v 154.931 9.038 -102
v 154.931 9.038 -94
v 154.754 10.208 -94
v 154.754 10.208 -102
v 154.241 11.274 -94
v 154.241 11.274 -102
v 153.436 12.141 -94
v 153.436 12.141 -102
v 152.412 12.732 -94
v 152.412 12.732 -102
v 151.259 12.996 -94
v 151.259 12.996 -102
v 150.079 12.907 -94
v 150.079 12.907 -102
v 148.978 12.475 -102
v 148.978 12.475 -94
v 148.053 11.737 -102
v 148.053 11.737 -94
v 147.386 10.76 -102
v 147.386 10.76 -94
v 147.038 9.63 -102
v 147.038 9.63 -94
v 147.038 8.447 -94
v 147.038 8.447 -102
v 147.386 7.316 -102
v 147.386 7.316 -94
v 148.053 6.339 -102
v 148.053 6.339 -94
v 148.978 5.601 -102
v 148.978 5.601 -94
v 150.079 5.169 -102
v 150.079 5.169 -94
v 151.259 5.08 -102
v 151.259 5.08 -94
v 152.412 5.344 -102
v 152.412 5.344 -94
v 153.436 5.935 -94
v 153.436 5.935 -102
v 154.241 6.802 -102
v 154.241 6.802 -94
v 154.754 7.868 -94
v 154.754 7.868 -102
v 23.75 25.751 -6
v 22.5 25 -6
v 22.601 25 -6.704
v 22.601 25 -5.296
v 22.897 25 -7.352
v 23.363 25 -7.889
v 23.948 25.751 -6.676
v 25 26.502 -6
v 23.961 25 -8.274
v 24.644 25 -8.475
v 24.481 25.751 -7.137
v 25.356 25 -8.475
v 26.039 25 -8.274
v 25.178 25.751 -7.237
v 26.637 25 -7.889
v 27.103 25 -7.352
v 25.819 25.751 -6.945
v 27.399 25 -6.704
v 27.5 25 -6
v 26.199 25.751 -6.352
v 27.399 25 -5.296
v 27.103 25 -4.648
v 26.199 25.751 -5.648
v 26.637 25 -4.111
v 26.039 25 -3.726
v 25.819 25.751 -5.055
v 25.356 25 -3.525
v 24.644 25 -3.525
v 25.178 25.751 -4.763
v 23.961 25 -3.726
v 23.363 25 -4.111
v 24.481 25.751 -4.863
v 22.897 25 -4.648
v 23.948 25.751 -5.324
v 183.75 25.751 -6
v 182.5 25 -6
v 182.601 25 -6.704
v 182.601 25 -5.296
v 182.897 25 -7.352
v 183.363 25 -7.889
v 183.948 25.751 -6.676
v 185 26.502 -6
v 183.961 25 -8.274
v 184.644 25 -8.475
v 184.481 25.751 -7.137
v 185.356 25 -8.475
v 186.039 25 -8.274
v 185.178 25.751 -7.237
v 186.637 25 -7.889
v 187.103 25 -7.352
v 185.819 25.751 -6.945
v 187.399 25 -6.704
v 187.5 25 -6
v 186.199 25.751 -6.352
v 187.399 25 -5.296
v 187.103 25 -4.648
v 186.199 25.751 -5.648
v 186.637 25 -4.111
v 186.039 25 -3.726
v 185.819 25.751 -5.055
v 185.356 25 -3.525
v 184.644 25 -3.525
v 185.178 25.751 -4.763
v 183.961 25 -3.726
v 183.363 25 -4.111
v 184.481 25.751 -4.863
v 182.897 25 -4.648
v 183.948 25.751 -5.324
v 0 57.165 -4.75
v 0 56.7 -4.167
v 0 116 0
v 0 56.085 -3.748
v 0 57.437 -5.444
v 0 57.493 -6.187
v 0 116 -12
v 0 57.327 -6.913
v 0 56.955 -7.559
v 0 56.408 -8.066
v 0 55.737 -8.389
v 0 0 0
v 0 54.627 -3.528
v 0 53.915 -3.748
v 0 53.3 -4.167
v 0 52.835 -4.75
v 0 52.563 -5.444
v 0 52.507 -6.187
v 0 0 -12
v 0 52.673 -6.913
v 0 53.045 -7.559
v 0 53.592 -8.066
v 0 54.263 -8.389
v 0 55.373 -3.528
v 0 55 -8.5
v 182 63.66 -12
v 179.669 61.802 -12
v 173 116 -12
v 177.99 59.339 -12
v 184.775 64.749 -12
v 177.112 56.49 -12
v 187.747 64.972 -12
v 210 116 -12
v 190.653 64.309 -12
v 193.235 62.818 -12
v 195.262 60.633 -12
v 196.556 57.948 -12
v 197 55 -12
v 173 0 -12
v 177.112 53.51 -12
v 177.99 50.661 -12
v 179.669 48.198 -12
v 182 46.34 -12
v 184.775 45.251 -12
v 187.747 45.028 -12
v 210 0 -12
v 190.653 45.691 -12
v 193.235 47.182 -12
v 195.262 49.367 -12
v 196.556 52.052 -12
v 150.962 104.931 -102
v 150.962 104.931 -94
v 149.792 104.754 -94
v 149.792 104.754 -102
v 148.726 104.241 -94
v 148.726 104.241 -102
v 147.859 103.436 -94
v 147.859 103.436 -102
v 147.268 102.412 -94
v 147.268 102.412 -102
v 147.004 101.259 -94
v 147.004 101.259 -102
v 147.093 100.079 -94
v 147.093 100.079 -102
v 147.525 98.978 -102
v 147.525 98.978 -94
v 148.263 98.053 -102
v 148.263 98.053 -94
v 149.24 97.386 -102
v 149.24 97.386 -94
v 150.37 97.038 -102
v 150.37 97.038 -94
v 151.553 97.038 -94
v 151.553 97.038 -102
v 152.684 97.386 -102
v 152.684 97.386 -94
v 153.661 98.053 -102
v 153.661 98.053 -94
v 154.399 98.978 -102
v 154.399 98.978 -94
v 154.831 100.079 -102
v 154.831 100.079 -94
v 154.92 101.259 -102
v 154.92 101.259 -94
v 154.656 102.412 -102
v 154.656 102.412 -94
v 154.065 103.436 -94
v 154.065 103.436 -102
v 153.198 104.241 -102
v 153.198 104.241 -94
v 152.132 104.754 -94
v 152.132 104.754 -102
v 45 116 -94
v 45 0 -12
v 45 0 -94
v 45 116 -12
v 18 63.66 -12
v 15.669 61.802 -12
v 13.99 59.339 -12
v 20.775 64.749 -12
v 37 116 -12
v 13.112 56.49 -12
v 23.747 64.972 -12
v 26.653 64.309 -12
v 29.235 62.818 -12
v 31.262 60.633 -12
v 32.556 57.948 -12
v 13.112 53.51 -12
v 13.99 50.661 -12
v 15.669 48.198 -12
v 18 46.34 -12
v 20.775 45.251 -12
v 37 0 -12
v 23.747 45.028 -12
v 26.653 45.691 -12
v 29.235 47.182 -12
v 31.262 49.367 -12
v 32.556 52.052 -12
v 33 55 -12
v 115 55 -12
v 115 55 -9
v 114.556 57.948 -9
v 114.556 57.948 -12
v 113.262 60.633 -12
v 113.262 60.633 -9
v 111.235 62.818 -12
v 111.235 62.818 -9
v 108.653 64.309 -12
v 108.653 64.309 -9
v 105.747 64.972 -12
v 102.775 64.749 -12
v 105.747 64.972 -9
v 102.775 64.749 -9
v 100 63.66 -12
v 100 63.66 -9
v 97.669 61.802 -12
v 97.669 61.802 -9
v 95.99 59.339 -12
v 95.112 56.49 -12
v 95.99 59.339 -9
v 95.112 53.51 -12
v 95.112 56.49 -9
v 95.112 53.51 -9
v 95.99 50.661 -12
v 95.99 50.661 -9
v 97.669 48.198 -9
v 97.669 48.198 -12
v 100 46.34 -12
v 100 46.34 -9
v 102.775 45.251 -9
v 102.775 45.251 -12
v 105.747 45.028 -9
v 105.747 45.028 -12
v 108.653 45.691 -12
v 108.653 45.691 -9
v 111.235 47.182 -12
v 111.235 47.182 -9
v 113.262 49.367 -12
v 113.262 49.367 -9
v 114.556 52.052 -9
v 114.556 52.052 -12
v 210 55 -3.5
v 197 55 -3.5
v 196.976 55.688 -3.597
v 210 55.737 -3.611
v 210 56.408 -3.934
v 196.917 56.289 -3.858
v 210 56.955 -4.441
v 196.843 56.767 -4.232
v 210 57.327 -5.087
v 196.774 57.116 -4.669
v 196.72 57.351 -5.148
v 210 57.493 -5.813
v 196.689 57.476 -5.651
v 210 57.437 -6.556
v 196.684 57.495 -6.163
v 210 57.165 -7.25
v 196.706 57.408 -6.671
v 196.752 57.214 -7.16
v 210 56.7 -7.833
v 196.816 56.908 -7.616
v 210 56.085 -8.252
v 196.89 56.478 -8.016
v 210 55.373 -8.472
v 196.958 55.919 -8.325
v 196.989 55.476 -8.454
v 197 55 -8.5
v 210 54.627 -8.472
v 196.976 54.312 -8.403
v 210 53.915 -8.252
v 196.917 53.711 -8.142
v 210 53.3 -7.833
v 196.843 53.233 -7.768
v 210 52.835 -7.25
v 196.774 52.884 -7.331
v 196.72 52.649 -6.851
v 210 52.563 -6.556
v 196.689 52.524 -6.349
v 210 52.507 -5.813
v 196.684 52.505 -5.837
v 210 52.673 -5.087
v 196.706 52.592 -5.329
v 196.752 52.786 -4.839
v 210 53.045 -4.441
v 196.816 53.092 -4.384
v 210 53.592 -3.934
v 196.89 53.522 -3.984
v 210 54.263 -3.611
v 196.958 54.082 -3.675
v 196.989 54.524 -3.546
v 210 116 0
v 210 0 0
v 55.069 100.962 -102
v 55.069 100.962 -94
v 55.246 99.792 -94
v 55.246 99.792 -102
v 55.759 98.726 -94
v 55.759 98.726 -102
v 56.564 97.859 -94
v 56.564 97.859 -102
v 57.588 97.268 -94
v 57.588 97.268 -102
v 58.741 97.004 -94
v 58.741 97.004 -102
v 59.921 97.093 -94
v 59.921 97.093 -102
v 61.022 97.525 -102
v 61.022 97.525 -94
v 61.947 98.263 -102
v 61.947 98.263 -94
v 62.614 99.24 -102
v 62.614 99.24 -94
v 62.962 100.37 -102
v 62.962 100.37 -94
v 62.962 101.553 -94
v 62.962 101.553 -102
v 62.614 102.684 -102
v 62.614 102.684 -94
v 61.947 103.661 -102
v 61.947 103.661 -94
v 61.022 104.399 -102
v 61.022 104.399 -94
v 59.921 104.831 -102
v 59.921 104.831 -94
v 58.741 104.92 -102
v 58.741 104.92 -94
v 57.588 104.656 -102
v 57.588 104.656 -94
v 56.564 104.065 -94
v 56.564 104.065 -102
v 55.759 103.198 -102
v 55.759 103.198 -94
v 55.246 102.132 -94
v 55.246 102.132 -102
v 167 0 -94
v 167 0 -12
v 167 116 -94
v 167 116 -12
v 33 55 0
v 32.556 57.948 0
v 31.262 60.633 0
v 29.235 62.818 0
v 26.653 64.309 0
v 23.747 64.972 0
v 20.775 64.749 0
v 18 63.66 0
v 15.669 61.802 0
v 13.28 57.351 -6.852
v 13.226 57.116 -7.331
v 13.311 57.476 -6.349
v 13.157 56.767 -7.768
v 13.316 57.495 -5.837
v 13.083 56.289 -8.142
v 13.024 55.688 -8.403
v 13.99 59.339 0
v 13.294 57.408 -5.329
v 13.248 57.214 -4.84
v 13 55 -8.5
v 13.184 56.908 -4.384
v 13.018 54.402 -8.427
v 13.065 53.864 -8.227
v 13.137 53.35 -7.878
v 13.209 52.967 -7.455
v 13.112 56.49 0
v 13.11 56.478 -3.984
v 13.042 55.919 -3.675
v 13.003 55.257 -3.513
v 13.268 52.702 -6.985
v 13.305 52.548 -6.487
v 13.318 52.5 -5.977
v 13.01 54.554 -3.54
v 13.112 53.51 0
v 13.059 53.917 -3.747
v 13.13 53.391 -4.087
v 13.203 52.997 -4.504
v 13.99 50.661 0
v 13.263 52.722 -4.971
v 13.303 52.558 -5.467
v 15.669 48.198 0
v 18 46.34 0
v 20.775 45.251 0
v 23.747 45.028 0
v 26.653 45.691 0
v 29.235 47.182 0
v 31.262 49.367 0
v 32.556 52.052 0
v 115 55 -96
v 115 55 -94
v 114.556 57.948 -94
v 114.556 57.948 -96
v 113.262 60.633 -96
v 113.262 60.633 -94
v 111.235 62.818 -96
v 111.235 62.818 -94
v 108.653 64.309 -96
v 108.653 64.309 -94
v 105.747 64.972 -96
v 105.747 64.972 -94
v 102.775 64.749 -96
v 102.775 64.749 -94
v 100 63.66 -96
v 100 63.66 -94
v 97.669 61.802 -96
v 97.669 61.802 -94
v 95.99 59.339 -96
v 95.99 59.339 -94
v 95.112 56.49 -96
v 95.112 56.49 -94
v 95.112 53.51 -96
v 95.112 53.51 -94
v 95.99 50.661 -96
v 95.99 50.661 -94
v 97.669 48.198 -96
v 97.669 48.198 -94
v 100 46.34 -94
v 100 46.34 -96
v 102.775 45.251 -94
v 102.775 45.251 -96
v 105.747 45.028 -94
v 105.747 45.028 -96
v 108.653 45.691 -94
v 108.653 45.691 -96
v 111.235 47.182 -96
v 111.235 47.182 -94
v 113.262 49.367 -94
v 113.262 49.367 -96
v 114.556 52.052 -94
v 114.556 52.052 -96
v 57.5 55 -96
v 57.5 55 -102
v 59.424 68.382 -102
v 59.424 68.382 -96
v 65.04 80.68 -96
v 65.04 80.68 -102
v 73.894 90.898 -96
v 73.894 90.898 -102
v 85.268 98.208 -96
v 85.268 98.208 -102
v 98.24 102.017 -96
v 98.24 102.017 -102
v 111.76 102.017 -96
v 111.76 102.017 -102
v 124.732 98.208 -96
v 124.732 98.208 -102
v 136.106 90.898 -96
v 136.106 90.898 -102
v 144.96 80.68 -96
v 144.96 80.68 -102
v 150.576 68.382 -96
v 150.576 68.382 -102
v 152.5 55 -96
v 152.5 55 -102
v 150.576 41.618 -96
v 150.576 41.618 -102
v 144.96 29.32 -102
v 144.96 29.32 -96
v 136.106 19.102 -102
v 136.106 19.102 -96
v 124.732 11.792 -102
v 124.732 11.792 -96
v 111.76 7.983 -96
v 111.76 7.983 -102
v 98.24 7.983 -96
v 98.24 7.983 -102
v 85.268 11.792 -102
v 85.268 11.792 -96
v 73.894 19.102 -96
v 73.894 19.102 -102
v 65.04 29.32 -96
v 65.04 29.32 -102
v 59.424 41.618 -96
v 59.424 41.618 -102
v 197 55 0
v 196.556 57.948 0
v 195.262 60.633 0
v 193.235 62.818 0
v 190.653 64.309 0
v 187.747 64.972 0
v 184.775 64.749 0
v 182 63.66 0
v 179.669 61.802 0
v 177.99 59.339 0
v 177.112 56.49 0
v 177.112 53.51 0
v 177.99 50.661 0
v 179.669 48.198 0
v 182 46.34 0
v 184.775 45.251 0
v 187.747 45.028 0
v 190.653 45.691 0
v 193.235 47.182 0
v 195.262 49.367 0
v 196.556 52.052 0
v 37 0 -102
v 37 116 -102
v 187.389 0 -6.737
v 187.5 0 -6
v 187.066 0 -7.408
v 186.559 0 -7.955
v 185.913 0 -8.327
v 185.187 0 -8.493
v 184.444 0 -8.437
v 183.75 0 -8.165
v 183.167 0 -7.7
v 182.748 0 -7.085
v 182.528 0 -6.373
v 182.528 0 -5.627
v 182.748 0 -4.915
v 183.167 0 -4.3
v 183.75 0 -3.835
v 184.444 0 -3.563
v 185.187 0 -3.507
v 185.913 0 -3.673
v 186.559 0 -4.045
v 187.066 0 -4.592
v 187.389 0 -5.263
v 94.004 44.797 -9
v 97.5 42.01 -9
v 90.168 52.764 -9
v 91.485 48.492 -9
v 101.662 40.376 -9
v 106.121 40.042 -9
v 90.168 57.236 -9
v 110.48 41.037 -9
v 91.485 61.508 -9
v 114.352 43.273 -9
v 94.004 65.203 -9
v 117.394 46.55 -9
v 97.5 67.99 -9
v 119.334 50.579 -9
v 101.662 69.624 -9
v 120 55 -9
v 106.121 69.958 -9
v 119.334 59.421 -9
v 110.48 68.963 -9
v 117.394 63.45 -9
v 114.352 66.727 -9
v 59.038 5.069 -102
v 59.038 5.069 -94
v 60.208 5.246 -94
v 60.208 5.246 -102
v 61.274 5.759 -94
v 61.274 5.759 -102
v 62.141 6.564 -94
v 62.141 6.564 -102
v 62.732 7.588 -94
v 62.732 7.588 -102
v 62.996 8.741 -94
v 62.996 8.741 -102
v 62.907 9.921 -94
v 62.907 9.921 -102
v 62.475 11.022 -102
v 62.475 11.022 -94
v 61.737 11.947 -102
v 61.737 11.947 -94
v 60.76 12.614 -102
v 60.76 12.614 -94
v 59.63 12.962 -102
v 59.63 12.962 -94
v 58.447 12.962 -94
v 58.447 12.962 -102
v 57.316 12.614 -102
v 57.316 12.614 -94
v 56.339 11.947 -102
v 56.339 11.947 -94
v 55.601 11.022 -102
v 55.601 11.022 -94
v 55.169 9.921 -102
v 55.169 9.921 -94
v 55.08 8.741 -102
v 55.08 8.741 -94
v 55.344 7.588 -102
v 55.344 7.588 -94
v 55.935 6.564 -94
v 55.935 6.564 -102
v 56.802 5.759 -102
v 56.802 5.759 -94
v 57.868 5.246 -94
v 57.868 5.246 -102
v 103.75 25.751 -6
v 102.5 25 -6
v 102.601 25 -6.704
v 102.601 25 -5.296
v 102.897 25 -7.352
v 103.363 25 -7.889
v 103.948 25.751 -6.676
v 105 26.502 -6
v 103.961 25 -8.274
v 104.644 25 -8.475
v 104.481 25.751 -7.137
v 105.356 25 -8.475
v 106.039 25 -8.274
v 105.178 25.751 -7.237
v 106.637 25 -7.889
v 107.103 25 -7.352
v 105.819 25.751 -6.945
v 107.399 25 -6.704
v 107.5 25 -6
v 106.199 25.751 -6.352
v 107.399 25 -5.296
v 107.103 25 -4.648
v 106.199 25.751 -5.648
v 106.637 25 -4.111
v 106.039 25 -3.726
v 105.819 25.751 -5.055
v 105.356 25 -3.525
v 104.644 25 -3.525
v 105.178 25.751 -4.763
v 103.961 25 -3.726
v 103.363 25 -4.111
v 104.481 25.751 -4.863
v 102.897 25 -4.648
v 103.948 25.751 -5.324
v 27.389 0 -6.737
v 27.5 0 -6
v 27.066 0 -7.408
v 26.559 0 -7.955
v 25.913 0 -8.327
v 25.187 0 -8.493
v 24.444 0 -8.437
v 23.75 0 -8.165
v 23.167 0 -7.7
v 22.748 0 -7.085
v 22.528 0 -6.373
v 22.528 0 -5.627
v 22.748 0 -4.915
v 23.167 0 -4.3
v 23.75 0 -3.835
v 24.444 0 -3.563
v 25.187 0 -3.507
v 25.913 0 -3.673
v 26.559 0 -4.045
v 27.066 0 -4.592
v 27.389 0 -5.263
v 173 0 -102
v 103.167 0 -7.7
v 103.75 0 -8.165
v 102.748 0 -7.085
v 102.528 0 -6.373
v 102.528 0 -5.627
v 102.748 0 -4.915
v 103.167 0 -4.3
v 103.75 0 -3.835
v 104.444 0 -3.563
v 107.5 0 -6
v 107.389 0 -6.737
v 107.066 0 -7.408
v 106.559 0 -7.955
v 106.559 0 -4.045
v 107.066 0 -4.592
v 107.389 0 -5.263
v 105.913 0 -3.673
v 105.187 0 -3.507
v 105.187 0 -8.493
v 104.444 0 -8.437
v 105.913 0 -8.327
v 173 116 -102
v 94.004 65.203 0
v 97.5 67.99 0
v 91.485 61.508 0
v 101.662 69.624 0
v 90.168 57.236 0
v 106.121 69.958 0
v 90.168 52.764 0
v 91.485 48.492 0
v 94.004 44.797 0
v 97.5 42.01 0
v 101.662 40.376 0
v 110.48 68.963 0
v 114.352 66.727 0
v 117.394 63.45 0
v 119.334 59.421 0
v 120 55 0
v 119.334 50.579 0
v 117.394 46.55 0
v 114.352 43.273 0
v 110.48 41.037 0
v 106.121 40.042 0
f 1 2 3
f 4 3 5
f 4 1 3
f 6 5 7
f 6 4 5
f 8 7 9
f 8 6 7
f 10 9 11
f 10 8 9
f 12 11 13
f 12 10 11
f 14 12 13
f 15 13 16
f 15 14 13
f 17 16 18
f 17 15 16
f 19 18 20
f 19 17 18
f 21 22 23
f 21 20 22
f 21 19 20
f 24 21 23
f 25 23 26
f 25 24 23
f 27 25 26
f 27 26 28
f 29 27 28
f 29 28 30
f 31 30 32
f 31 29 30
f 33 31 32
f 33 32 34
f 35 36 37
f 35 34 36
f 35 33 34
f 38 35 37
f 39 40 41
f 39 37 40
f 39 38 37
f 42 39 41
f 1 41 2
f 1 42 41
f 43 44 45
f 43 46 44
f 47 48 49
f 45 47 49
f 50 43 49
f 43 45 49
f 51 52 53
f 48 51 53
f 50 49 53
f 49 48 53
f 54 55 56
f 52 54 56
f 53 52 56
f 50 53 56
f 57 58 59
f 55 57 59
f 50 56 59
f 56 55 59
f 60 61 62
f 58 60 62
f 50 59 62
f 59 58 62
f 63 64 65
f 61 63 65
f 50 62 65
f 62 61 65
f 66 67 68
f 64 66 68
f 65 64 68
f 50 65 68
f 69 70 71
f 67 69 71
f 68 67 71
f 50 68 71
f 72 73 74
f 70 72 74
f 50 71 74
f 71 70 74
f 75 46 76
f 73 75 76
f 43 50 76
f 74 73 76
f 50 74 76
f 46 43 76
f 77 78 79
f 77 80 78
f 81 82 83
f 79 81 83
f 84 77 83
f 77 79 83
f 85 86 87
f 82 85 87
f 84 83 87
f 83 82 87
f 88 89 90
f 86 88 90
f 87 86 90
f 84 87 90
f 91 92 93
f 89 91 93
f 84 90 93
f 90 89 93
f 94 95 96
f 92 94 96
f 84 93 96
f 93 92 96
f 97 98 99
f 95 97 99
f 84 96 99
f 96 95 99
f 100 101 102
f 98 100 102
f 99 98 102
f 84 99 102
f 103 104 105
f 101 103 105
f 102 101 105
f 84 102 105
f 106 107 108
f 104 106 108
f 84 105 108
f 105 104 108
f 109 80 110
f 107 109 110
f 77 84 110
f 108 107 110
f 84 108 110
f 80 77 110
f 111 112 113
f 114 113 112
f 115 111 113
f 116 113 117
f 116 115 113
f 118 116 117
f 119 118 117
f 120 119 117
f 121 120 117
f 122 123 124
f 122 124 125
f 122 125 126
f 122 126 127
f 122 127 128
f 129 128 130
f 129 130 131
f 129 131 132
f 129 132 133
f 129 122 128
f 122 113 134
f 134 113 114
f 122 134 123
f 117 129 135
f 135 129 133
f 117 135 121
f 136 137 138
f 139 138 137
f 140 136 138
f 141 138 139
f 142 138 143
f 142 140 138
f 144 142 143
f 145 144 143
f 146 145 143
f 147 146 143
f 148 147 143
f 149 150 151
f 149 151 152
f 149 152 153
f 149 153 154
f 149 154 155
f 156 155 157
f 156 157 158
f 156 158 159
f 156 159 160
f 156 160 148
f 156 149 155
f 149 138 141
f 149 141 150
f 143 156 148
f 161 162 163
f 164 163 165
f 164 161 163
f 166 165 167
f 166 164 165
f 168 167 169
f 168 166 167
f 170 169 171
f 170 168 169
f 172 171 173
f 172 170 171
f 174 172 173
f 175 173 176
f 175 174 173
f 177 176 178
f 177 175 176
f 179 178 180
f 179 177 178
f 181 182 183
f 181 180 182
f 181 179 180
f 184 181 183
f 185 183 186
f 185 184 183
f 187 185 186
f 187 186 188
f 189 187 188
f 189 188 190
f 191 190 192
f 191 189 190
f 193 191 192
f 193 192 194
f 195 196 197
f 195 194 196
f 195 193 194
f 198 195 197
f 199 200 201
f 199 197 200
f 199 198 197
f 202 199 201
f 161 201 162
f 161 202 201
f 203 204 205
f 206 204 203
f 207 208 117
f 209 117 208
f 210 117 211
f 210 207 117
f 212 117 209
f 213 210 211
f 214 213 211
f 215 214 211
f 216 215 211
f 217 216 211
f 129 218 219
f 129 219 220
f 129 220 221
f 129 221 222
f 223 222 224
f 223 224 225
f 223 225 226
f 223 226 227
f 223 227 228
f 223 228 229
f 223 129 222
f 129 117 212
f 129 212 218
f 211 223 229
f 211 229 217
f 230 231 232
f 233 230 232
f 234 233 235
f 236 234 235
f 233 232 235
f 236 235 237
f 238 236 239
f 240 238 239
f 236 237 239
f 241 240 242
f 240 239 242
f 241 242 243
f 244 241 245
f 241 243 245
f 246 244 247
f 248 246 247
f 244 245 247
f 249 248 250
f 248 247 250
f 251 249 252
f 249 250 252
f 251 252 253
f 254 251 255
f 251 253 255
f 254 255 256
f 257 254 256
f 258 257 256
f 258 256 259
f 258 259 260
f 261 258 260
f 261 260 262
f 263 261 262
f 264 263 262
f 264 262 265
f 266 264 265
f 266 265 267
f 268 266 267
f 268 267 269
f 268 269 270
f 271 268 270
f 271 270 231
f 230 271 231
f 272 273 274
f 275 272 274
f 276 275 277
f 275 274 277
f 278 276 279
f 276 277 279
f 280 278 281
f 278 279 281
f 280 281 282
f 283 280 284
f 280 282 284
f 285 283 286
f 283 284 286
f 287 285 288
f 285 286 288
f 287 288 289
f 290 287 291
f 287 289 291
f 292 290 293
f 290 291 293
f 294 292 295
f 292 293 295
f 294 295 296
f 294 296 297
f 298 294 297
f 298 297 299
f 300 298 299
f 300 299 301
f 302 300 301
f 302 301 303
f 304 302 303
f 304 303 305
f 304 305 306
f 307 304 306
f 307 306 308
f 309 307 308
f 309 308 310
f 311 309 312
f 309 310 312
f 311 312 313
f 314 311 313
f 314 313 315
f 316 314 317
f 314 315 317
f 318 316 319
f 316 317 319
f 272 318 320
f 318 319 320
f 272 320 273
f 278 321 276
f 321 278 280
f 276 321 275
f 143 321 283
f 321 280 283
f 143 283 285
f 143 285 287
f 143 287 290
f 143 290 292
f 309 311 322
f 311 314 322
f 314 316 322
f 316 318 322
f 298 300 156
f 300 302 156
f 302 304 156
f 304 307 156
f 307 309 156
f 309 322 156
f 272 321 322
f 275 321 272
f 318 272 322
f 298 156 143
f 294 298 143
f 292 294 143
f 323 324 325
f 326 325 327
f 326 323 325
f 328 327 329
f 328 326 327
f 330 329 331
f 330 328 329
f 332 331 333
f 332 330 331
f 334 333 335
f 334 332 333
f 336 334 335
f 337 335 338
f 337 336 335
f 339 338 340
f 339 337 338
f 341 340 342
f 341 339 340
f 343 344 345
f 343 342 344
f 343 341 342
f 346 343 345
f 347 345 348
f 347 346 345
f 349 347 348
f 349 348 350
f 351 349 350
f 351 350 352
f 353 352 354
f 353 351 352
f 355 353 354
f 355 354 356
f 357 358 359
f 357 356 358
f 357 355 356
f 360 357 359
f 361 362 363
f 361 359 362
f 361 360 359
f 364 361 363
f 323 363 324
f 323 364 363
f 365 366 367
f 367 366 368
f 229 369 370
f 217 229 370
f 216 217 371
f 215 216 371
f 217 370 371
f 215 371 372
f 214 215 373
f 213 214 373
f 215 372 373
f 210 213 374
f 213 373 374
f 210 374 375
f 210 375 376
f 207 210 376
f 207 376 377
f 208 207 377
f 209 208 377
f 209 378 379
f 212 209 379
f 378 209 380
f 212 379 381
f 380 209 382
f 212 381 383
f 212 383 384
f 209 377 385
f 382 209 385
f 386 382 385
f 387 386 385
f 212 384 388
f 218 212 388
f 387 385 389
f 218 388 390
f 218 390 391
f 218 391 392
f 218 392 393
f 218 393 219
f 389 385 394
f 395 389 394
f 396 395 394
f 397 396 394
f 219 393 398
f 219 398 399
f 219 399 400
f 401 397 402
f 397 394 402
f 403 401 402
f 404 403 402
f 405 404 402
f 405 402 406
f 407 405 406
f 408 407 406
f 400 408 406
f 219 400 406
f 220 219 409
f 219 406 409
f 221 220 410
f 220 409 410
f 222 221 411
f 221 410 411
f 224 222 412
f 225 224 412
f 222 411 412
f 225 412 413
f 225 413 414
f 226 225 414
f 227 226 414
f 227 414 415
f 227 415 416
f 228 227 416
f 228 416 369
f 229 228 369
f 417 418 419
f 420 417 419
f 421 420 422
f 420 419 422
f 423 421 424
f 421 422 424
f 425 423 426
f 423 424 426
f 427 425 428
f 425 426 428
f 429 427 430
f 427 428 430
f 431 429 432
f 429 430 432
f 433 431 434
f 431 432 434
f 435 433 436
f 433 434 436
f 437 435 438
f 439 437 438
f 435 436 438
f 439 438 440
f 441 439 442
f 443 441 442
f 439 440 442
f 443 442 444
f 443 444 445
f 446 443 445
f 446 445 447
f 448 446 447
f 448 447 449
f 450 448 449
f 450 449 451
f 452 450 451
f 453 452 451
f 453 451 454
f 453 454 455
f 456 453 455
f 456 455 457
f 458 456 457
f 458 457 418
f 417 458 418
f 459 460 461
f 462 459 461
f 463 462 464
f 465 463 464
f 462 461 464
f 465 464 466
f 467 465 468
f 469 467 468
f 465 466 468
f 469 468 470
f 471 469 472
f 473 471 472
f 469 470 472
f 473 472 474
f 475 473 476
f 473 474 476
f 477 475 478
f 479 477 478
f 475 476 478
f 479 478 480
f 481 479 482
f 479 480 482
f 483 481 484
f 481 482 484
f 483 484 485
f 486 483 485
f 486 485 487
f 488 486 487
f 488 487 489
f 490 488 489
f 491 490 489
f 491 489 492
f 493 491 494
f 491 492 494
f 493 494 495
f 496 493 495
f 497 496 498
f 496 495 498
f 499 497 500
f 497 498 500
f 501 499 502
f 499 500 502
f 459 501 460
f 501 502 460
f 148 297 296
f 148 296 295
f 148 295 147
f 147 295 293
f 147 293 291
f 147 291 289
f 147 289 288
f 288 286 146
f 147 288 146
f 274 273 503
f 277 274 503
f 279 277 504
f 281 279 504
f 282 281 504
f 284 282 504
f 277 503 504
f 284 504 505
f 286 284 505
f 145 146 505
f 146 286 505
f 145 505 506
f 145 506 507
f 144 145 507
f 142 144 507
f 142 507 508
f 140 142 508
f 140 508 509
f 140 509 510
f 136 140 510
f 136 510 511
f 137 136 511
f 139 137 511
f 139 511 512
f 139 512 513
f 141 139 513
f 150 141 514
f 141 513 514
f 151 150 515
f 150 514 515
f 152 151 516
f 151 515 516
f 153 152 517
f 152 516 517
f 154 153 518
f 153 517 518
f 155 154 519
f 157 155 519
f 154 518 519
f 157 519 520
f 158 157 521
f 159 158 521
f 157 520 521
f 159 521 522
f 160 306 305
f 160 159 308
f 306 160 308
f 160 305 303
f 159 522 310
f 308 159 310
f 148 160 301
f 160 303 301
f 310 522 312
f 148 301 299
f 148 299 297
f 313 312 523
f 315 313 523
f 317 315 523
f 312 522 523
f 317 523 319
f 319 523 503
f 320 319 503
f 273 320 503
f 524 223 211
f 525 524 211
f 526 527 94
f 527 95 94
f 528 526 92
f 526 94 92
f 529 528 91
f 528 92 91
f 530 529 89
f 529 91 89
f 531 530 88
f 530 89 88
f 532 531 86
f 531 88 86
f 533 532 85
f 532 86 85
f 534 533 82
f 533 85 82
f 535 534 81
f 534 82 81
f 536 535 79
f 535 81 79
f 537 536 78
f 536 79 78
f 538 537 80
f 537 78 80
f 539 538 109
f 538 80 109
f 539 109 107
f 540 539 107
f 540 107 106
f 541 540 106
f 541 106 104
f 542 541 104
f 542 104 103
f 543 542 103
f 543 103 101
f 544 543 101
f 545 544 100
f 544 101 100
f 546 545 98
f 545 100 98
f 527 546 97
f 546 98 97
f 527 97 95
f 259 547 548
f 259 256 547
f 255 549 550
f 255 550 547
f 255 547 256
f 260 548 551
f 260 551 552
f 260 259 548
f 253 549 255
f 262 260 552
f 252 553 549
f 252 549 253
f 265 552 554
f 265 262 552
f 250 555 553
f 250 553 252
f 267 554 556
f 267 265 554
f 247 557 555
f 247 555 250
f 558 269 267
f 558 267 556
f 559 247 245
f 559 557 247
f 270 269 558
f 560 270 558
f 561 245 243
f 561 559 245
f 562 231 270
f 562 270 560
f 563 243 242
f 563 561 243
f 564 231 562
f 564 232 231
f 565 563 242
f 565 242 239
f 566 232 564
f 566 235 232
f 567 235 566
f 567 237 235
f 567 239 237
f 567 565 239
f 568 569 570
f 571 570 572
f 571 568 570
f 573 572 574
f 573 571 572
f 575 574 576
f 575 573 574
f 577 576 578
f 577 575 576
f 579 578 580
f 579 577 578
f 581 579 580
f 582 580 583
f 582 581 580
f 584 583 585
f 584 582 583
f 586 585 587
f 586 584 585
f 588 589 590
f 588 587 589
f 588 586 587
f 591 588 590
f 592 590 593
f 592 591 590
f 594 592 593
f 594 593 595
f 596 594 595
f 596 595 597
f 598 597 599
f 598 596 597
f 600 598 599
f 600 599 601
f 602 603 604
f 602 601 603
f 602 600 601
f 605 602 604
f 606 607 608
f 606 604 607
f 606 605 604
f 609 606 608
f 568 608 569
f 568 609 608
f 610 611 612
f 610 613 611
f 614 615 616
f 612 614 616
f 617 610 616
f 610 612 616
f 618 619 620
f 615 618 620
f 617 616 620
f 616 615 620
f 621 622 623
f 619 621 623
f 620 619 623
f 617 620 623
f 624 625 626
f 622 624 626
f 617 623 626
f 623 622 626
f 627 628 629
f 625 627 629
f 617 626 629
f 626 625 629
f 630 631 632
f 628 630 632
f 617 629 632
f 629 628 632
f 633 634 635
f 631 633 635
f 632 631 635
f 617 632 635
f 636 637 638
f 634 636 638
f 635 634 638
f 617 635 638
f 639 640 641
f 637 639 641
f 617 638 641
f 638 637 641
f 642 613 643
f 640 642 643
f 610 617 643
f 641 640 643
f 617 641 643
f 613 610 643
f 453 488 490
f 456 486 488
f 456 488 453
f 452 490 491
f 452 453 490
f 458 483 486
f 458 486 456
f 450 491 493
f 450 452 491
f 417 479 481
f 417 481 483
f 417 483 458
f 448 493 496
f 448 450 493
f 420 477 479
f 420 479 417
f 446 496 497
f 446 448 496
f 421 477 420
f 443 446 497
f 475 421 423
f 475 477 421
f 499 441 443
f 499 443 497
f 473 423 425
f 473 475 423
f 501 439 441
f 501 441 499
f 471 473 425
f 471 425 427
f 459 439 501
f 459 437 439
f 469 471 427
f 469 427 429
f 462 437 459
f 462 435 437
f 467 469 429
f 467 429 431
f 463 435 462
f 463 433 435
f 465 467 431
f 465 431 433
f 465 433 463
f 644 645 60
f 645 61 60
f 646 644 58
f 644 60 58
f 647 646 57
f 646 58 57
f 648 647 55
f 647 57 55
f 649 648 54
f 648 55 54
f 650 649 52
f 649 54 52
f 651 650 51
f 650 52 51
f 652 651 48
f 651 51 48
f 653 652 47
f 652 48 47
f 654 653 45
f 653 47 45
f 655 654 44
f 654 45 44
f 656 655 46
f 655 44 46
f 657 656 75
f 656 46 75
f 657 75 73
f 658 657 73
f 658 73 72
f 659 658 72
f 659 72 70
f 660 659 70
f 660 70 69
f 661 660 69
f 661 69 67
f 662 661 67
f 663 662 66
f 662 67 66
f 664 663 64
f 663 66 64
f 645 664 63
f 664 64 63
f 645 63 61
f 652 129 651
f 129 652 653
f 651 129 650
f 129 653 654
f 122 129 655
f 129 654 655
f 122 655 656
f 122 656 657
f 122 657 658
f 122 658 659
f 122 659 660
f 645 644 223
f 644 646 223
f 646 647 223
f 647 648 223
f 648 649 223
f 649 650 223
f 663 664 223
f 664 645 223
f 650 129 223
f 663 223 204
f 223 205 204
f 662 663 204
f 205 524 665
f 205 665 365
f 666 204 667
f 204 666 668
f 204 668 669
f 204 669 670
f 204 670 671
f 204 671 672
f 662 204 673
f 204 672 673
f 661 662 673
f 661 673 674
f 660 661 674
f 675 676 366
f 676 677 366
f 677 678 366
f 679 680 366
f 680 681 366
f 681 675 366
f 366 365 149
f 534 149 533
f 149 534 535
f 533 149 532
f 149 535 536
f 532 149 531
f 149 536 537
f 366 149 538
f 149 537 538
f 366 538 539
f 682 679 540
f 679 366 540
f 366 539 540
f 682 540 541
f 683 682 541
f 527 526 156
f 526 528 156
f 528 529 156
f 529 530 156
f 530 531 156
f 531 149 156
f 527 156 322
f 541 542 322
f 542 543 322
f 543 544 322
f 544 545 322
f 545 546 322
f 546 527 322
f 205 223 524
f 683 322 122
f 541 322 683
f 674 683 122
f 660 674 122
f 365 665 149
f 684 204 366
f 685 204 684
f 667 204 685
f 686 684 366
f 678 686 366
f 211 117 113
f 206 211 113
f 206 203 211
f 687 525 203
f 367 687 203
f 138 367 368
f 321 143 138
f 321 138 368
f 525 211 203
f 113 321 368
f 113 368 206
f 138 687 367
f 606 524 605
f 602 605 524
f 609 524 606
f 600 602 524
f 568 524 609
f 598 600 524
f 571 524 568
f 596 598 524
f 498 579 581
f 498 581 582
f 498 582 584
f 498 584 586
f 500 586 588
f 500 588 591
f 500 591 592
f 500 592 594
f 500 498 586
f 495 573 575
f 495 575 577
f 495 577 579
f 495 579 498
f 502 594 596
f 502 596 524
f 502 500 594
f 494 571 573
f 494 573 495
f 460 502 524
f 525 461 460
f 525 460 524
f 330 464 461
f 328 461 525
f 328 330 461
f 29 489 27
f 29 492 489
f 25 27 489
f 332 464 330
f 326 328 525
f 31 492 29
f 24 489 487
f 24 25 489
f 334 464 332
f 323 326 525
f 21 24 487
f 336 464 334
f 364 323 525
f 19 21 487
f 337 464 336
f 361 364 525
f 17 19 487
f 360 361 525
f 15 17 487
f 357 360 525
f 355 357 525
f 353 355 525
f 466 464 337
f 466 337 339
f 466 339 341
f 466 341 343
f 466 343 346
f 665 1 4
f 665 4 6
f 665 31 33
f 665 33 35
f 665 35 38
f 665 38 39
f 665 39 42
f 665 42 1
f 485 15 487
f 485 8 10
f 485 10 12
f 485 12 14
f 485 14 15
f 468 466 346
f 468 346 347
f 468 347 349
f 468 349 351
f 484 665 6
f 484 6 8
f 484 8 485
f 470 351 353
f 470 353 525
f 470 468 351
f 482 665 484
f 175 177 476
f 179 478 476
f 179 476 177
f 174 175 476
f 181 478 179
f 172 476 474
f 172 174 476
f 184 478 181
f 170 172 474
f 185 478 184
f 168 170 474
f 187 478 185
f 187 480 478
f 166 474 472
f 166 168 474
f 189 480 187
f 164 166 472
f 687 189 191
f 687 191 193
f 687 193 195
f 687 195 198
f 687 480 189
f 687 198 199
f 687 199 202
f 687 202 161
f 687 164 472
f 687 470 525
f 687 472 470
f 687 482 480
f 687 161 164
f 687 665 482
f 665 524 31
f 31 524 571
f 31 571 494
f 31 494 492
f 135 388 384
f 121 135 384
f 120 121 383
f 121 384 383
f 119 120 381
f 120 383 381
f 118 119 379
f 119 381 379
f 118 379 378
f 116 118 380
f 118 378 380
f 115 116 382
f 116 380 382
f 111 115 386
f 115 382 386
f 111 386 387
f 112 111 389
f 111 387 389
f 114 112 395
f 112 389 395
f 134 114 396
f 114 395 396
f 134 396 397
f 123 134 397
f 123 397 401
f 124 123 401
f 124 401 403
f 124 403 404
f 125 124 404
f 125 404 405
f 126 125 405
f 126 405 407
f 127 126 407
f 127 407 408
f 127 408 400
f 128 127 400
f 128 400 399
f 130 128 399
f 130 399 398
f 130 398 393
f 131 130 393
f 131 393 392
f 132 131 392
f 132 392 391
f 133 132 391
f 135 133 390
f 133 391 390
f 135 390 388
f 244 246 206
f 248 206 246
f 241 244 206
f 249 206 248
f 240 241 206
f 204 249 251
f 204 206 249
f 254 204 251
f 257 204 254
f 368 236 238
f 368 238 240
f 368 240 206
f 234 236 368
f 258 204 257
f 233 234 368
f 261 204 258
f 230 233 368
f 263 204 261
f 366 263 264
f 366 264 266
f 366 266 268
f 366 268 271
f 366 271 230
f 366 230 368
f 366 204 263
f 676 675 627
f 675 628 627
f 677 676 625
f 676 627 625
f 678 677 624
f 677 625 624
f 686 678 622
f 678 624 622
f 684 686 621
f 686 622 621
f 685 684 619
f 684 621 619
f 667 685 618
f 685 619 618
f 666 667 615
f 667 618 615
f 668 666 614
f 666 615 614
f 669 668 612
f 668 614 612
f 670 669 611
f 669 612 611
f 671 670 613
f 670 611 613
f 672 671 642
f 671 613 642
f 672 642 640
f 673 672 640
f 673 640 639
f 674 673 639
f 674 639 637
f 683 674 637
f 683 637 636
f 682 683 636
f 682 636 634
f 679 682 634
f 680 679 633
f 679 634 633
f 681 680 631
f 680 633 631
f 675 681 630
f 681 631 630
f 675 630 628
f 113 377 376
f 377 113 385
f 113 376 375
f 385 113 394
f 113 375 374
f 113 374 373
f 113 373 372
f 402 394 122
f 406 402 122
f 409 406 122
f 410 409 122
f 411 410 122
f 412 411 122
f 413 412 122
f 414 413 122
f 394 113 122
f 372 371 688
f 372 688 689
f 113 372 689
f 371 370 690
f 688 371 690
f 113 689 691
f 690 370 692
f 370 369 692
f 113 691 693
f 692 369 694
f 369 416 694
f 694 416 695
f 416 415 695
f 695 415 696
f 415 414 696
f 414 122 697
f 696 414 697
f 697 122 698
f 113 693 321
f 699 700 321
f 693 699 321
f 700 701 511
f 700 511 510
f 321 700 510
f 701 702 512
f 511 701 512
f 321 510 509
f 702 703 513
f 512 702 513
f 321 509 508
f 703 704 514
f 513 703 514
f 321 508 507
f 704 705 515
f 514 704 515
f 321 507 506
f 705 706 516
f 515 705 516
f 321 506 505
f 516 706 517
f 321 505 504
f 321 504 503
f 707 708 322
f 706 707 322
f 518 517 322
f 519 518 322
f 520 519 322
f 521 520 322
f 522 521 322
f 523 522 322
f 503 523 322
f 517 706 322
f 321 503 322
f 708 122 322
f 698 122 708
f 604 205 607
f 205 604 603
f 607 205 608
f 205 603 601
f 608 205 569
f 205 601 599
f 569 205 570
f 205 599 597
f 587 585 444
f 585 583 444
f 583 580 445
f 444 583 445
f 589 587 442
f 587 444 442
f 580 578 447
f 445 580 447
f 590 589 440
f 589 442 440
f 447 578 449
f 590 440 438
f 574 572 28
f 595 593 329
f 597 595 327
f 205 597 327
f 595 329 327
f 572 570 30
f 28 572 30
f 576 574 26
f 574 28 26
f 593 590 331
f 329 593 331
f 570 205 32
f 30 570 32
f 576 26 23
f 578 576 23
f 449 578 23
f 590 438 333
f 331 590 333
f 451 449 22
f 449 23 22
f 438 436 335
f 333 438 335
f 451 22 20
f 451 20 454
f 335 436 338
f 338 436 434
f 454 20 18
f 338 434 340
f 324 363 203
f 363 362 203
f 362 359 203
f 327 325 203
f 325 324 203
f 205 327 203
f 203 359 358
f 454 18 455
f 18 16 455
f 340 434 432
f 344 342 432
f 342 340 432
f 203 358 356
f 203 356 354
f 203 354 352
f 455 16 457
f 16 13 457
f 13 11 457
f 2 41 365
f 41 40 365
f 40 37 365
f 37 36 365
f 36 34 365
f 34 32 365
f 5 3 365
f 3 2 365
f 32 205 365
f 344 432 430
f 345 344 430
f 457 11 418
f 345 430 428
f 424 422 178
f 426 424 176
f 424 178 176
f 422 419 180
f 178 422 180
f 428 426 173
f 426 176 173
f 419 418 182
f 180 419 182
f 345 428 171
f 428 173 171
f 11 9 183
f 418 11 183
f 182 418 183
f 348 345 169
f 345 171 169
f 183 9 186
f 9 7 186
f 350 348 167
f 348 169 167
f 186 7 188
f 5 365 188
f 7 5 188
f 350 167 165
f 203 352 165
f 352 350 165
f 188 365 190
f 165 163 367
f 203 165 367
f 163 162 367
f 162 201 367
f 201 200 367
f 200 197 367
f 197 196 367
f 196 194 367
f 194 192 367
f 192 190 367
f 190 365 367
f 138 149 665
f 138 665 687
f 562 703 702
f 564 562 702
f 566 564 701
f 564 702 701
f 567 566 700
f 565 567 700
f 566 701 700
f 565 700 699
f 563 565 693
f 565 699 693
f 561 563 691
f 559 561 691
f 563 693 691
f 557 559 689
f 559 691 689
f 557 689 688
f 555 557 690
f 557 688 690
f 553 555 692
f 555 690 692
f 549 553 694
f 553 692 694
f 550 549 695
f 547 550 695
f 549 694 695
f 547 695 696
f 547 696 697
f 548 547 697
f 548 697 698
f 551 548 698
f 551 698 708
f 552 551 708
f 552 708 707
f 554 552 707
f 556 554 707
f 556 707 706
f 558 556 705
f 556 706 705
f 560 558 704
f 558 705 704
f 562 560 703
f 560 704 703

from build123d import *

# Parameters (mm, degrees)
SKETCH1_W                 = 210
SKETCH1_H                 = 12
BOSS_EXTRUDE1_DEPTH       = 116
SKETCH2_R                 = 10
CUT_EXTRUDE1_DEPTH        = 241.208242989
F_5_0MM_DOWEL_HOLE1_D     = 5
F_5_0MM_DOWEL_HOLE1_DEPTH = 25
F_5_0MM_DOWEL_HOLE1_TIP   = 1.502151548
F_5_0MM_DOWEL_HOLE2_D     = 5
F_5_0MM_DOWEL_HOLE2_DEPTH = 25
F_5_0MM_DOWEL_HOLE2_TIP   = 1.502151548
F_5_0MM_DOWEL_HOLE3_D     = 5
F_5_0MM_DOWEL_HOLE3_DEPTH = 25
F_5_0MM_DOWEL_HOLE3_TIP   = 1.502151548
SKETCH11_W                = 8
SKETCH11_H                = 116
SKETCH11_W_2              = 6
BOSS_EXTRUDE2_DEPTH       = 90
BOSS_EXTRUDE4_REACH       = 229.484
SKETCH12_W                = 8
SKETCH12_H                = 116
SKETCH7_R                 = 10
CUT_EXTRUDE3_DEPTH        = 261.691388508
SKETCH13_R                = 47.5
CUT_EXTRUDE4_DEPTH        = 6
CIRPATTERN1_COUNT         = 4
SKETCH16_R                = 15
CUT_EXTRUDE5_DEPTH        = 9


with BuildPart() as part:
    # Sketch1 → Boss-Extrude1 (new body)
    with BuildSketch(Plane(origin=(0, 0, 0), x_dir=(1, 0, 0), z_dir=(0, 1, 0))):
        with Locations((105, 6)):
            Rectangle(SKETCH1_W, SKETCH1_H)
    extrude(amount=BOSS_EXTRUDE1_DEPTH)

    # Sketch2 → Cut-Extrude1 (cut, through all)
    with BuildSketch(Plane.XY):
        with Locations((23, 55)):
            Circle(SKETCH2_R)
        with Locations((187, 55)):
            Circle(SKETCH2_R)
    extrude(amount=-CUT_EXTRUDE1_DEPTH, mode=Mode.SUBTRACT)

    # Ø5.0mm Dowel Hole1
    with Locations(Plane.ZY):
        with Locations((-6, 55)):
            Hole(F_5_0MM_DOWEL_HOLE1_D / 2, depth=F_5_0MM_DOWEL_HOLE1_DEPTH)
            with Locations((0, 0, -(F_5_0MM_DOWEL_HOLE1_DEPTH + F_5_0MM_DOWEL_HOLE1_TIP / 2))):  # 118° drill point
                Cone(0, F_5_0MM_DOWEL_HOLE1_D / 2, F_5_0MM_DOWEL_HOLE1_TIP, mode=Mode.SUBTRACT)

    # Ø5.0mm Dowel Hole2
    with Locations(Plane(origin=(210, 0, 0), x_dir=(0, 0, -1), z_dir=(1, 0, 0))):
        with Locations((6, 55)):
            Hole(F_5_0MM_DOWEL_HOLE2_D / 2, depth=F_5_0MM_DOWEL_HOLE2_DEPTH)
            with Locations((0, 0, -(F_5_0MM_DOWEL_HOLE2_DEPTH + F_5_0MM_DOWEL_HOLE2_TIP / 2))):  # 118° drill point
                Cone(0, F_5_0MM_DOWEL_HOLE2_D / 2, F_5_0MM_DOWEL_HOLE2_TIP, mode=Mode.SUBTRACT)

    # Ø5.0mm Dowel Hole3
    with Locations(Plane(origin=(0, 0, 0), x_dir=(-1, 0, 0), z_dir=(0, -1, 0))):
        with Locations((-25, 6), (-105, 6), (-185, 6)):
            Hole(F_5_0MM_DOWEL_HOLE3_D / 2, depth=F_5_0MM_DOWEL_HOLE3_DEPTH)
            with Locations((0, 0, -(F_5_0MM_DOWEL_HOLE3_DEPTH + F_5_0MM_DOWEL_HOLE3_TIP / 2))):  # 118° drill point
                Cone(0, F_5_0MM_DOWEL_HOLE3_D / 2, F_5_0MM_DOWEL_HOLE3_TIP, mode=Mode.SUBTRACT)

    # Sketch11 → Boss-Extrude2 (add)
    with BuildSketch(Plane(origin=(0, 0, -12), x_dir=(-1, 0, 0), z_dir=(0, 0, -1))):
        with Locations((-41, 58)):
            Rectangle(SKETCH11_W, SKETCH11_H)
        with Locations((-170, 58)):
            Rectangle(SKETCH11_W_2, SKETCH11_H)
    extrude(amount=BOSS_EXTRUDE2_DEPTH)

    # Sketch12 → Boss-Extrude4 (add, up to next)
    with BuildSketch(Plane.ZY.offset(-167), mode=Mode.PRIVATE) as boss_extrude4_sk1:
        with Locations((-98, 58)):
            Rectangle(SKETCH12_W, SKETCH12_H)
    boss_extrude4_tool1 = extrude(boss_extrude4_sk1.sketch, amount=BOSS_EXTRUDE4_REACH, mode=Mode.PRIVATE) - part.part
    add(boss_extrude4_tool1.solids().sort_by_distance((167, 58, -98))[0])

    # Sketch7 → Cut-Extrude3 (cut, through all)
    with BuildSketch(Plane.XY):
        with Locations((105, 55)):
            Circle(SKETCH7_R)
    extrude(amount=-CUT_EXTRUDE3_DEPTH, mode=Mode.SUBTRACT)

    # Sketch13 → Cut-Extrude4 (cut)
    with BuildSketch(Plane(origin=(0, 0, -102), x_dir=(-1, 0, 0), z_dir=(0, 0, -1))):
        with Locations((-105, 55)):
            Circle(SKETCH13_R)
    extrude(amount=-CUT_EXTRUDE4_DEPTH, mode=Mode.SUBTRACT)

    # Sketch14 → 5/16 (0.3125) Diameter Hole1 (revolve, cut)
    with BuildSketch(Plane(origin=(150.961940777, 100.961940777, -102), x_dir=(0, 1, 0), z_dir=(1, 0, 0))):
        Polygon((0, 0), (0, 14.384665582), (3.96875, 12), (3.96875, 0), align=None)
    f_5_16_0_3125_diameter_hole1 = revolve(axis=Axis((150.961940777, 100.961940777, -108.35), (0, 0, 1)), mode=Mode.SUBTRACT)

    # CirPattern1: 5/16 (0.3125) Diameter Hole1 ×4 about axis
    cirpattern1_axis = Axis((105, 55, -96), (0, 0, 1))
    for i in range(1, CIRPATTERN1_COUNT):
        add(f_5_16_0_3125_diameter_hole1.rotate(cirpattern1_axis, i * 360 / CIRPATTERN1_COUNT), mode=Mode.SUBTRACT)

    # Sketch16 → Cut-Extrude5 (cut)
    with BuildSketch(Plane.XY):
        with Locations((105, 55)):
            Circle(SKETCH16_R)
    extrude(amount=-CUT_EXTRUDE5_DEPTH, mode=Mode.SUBTRACT)


solid = part.part
